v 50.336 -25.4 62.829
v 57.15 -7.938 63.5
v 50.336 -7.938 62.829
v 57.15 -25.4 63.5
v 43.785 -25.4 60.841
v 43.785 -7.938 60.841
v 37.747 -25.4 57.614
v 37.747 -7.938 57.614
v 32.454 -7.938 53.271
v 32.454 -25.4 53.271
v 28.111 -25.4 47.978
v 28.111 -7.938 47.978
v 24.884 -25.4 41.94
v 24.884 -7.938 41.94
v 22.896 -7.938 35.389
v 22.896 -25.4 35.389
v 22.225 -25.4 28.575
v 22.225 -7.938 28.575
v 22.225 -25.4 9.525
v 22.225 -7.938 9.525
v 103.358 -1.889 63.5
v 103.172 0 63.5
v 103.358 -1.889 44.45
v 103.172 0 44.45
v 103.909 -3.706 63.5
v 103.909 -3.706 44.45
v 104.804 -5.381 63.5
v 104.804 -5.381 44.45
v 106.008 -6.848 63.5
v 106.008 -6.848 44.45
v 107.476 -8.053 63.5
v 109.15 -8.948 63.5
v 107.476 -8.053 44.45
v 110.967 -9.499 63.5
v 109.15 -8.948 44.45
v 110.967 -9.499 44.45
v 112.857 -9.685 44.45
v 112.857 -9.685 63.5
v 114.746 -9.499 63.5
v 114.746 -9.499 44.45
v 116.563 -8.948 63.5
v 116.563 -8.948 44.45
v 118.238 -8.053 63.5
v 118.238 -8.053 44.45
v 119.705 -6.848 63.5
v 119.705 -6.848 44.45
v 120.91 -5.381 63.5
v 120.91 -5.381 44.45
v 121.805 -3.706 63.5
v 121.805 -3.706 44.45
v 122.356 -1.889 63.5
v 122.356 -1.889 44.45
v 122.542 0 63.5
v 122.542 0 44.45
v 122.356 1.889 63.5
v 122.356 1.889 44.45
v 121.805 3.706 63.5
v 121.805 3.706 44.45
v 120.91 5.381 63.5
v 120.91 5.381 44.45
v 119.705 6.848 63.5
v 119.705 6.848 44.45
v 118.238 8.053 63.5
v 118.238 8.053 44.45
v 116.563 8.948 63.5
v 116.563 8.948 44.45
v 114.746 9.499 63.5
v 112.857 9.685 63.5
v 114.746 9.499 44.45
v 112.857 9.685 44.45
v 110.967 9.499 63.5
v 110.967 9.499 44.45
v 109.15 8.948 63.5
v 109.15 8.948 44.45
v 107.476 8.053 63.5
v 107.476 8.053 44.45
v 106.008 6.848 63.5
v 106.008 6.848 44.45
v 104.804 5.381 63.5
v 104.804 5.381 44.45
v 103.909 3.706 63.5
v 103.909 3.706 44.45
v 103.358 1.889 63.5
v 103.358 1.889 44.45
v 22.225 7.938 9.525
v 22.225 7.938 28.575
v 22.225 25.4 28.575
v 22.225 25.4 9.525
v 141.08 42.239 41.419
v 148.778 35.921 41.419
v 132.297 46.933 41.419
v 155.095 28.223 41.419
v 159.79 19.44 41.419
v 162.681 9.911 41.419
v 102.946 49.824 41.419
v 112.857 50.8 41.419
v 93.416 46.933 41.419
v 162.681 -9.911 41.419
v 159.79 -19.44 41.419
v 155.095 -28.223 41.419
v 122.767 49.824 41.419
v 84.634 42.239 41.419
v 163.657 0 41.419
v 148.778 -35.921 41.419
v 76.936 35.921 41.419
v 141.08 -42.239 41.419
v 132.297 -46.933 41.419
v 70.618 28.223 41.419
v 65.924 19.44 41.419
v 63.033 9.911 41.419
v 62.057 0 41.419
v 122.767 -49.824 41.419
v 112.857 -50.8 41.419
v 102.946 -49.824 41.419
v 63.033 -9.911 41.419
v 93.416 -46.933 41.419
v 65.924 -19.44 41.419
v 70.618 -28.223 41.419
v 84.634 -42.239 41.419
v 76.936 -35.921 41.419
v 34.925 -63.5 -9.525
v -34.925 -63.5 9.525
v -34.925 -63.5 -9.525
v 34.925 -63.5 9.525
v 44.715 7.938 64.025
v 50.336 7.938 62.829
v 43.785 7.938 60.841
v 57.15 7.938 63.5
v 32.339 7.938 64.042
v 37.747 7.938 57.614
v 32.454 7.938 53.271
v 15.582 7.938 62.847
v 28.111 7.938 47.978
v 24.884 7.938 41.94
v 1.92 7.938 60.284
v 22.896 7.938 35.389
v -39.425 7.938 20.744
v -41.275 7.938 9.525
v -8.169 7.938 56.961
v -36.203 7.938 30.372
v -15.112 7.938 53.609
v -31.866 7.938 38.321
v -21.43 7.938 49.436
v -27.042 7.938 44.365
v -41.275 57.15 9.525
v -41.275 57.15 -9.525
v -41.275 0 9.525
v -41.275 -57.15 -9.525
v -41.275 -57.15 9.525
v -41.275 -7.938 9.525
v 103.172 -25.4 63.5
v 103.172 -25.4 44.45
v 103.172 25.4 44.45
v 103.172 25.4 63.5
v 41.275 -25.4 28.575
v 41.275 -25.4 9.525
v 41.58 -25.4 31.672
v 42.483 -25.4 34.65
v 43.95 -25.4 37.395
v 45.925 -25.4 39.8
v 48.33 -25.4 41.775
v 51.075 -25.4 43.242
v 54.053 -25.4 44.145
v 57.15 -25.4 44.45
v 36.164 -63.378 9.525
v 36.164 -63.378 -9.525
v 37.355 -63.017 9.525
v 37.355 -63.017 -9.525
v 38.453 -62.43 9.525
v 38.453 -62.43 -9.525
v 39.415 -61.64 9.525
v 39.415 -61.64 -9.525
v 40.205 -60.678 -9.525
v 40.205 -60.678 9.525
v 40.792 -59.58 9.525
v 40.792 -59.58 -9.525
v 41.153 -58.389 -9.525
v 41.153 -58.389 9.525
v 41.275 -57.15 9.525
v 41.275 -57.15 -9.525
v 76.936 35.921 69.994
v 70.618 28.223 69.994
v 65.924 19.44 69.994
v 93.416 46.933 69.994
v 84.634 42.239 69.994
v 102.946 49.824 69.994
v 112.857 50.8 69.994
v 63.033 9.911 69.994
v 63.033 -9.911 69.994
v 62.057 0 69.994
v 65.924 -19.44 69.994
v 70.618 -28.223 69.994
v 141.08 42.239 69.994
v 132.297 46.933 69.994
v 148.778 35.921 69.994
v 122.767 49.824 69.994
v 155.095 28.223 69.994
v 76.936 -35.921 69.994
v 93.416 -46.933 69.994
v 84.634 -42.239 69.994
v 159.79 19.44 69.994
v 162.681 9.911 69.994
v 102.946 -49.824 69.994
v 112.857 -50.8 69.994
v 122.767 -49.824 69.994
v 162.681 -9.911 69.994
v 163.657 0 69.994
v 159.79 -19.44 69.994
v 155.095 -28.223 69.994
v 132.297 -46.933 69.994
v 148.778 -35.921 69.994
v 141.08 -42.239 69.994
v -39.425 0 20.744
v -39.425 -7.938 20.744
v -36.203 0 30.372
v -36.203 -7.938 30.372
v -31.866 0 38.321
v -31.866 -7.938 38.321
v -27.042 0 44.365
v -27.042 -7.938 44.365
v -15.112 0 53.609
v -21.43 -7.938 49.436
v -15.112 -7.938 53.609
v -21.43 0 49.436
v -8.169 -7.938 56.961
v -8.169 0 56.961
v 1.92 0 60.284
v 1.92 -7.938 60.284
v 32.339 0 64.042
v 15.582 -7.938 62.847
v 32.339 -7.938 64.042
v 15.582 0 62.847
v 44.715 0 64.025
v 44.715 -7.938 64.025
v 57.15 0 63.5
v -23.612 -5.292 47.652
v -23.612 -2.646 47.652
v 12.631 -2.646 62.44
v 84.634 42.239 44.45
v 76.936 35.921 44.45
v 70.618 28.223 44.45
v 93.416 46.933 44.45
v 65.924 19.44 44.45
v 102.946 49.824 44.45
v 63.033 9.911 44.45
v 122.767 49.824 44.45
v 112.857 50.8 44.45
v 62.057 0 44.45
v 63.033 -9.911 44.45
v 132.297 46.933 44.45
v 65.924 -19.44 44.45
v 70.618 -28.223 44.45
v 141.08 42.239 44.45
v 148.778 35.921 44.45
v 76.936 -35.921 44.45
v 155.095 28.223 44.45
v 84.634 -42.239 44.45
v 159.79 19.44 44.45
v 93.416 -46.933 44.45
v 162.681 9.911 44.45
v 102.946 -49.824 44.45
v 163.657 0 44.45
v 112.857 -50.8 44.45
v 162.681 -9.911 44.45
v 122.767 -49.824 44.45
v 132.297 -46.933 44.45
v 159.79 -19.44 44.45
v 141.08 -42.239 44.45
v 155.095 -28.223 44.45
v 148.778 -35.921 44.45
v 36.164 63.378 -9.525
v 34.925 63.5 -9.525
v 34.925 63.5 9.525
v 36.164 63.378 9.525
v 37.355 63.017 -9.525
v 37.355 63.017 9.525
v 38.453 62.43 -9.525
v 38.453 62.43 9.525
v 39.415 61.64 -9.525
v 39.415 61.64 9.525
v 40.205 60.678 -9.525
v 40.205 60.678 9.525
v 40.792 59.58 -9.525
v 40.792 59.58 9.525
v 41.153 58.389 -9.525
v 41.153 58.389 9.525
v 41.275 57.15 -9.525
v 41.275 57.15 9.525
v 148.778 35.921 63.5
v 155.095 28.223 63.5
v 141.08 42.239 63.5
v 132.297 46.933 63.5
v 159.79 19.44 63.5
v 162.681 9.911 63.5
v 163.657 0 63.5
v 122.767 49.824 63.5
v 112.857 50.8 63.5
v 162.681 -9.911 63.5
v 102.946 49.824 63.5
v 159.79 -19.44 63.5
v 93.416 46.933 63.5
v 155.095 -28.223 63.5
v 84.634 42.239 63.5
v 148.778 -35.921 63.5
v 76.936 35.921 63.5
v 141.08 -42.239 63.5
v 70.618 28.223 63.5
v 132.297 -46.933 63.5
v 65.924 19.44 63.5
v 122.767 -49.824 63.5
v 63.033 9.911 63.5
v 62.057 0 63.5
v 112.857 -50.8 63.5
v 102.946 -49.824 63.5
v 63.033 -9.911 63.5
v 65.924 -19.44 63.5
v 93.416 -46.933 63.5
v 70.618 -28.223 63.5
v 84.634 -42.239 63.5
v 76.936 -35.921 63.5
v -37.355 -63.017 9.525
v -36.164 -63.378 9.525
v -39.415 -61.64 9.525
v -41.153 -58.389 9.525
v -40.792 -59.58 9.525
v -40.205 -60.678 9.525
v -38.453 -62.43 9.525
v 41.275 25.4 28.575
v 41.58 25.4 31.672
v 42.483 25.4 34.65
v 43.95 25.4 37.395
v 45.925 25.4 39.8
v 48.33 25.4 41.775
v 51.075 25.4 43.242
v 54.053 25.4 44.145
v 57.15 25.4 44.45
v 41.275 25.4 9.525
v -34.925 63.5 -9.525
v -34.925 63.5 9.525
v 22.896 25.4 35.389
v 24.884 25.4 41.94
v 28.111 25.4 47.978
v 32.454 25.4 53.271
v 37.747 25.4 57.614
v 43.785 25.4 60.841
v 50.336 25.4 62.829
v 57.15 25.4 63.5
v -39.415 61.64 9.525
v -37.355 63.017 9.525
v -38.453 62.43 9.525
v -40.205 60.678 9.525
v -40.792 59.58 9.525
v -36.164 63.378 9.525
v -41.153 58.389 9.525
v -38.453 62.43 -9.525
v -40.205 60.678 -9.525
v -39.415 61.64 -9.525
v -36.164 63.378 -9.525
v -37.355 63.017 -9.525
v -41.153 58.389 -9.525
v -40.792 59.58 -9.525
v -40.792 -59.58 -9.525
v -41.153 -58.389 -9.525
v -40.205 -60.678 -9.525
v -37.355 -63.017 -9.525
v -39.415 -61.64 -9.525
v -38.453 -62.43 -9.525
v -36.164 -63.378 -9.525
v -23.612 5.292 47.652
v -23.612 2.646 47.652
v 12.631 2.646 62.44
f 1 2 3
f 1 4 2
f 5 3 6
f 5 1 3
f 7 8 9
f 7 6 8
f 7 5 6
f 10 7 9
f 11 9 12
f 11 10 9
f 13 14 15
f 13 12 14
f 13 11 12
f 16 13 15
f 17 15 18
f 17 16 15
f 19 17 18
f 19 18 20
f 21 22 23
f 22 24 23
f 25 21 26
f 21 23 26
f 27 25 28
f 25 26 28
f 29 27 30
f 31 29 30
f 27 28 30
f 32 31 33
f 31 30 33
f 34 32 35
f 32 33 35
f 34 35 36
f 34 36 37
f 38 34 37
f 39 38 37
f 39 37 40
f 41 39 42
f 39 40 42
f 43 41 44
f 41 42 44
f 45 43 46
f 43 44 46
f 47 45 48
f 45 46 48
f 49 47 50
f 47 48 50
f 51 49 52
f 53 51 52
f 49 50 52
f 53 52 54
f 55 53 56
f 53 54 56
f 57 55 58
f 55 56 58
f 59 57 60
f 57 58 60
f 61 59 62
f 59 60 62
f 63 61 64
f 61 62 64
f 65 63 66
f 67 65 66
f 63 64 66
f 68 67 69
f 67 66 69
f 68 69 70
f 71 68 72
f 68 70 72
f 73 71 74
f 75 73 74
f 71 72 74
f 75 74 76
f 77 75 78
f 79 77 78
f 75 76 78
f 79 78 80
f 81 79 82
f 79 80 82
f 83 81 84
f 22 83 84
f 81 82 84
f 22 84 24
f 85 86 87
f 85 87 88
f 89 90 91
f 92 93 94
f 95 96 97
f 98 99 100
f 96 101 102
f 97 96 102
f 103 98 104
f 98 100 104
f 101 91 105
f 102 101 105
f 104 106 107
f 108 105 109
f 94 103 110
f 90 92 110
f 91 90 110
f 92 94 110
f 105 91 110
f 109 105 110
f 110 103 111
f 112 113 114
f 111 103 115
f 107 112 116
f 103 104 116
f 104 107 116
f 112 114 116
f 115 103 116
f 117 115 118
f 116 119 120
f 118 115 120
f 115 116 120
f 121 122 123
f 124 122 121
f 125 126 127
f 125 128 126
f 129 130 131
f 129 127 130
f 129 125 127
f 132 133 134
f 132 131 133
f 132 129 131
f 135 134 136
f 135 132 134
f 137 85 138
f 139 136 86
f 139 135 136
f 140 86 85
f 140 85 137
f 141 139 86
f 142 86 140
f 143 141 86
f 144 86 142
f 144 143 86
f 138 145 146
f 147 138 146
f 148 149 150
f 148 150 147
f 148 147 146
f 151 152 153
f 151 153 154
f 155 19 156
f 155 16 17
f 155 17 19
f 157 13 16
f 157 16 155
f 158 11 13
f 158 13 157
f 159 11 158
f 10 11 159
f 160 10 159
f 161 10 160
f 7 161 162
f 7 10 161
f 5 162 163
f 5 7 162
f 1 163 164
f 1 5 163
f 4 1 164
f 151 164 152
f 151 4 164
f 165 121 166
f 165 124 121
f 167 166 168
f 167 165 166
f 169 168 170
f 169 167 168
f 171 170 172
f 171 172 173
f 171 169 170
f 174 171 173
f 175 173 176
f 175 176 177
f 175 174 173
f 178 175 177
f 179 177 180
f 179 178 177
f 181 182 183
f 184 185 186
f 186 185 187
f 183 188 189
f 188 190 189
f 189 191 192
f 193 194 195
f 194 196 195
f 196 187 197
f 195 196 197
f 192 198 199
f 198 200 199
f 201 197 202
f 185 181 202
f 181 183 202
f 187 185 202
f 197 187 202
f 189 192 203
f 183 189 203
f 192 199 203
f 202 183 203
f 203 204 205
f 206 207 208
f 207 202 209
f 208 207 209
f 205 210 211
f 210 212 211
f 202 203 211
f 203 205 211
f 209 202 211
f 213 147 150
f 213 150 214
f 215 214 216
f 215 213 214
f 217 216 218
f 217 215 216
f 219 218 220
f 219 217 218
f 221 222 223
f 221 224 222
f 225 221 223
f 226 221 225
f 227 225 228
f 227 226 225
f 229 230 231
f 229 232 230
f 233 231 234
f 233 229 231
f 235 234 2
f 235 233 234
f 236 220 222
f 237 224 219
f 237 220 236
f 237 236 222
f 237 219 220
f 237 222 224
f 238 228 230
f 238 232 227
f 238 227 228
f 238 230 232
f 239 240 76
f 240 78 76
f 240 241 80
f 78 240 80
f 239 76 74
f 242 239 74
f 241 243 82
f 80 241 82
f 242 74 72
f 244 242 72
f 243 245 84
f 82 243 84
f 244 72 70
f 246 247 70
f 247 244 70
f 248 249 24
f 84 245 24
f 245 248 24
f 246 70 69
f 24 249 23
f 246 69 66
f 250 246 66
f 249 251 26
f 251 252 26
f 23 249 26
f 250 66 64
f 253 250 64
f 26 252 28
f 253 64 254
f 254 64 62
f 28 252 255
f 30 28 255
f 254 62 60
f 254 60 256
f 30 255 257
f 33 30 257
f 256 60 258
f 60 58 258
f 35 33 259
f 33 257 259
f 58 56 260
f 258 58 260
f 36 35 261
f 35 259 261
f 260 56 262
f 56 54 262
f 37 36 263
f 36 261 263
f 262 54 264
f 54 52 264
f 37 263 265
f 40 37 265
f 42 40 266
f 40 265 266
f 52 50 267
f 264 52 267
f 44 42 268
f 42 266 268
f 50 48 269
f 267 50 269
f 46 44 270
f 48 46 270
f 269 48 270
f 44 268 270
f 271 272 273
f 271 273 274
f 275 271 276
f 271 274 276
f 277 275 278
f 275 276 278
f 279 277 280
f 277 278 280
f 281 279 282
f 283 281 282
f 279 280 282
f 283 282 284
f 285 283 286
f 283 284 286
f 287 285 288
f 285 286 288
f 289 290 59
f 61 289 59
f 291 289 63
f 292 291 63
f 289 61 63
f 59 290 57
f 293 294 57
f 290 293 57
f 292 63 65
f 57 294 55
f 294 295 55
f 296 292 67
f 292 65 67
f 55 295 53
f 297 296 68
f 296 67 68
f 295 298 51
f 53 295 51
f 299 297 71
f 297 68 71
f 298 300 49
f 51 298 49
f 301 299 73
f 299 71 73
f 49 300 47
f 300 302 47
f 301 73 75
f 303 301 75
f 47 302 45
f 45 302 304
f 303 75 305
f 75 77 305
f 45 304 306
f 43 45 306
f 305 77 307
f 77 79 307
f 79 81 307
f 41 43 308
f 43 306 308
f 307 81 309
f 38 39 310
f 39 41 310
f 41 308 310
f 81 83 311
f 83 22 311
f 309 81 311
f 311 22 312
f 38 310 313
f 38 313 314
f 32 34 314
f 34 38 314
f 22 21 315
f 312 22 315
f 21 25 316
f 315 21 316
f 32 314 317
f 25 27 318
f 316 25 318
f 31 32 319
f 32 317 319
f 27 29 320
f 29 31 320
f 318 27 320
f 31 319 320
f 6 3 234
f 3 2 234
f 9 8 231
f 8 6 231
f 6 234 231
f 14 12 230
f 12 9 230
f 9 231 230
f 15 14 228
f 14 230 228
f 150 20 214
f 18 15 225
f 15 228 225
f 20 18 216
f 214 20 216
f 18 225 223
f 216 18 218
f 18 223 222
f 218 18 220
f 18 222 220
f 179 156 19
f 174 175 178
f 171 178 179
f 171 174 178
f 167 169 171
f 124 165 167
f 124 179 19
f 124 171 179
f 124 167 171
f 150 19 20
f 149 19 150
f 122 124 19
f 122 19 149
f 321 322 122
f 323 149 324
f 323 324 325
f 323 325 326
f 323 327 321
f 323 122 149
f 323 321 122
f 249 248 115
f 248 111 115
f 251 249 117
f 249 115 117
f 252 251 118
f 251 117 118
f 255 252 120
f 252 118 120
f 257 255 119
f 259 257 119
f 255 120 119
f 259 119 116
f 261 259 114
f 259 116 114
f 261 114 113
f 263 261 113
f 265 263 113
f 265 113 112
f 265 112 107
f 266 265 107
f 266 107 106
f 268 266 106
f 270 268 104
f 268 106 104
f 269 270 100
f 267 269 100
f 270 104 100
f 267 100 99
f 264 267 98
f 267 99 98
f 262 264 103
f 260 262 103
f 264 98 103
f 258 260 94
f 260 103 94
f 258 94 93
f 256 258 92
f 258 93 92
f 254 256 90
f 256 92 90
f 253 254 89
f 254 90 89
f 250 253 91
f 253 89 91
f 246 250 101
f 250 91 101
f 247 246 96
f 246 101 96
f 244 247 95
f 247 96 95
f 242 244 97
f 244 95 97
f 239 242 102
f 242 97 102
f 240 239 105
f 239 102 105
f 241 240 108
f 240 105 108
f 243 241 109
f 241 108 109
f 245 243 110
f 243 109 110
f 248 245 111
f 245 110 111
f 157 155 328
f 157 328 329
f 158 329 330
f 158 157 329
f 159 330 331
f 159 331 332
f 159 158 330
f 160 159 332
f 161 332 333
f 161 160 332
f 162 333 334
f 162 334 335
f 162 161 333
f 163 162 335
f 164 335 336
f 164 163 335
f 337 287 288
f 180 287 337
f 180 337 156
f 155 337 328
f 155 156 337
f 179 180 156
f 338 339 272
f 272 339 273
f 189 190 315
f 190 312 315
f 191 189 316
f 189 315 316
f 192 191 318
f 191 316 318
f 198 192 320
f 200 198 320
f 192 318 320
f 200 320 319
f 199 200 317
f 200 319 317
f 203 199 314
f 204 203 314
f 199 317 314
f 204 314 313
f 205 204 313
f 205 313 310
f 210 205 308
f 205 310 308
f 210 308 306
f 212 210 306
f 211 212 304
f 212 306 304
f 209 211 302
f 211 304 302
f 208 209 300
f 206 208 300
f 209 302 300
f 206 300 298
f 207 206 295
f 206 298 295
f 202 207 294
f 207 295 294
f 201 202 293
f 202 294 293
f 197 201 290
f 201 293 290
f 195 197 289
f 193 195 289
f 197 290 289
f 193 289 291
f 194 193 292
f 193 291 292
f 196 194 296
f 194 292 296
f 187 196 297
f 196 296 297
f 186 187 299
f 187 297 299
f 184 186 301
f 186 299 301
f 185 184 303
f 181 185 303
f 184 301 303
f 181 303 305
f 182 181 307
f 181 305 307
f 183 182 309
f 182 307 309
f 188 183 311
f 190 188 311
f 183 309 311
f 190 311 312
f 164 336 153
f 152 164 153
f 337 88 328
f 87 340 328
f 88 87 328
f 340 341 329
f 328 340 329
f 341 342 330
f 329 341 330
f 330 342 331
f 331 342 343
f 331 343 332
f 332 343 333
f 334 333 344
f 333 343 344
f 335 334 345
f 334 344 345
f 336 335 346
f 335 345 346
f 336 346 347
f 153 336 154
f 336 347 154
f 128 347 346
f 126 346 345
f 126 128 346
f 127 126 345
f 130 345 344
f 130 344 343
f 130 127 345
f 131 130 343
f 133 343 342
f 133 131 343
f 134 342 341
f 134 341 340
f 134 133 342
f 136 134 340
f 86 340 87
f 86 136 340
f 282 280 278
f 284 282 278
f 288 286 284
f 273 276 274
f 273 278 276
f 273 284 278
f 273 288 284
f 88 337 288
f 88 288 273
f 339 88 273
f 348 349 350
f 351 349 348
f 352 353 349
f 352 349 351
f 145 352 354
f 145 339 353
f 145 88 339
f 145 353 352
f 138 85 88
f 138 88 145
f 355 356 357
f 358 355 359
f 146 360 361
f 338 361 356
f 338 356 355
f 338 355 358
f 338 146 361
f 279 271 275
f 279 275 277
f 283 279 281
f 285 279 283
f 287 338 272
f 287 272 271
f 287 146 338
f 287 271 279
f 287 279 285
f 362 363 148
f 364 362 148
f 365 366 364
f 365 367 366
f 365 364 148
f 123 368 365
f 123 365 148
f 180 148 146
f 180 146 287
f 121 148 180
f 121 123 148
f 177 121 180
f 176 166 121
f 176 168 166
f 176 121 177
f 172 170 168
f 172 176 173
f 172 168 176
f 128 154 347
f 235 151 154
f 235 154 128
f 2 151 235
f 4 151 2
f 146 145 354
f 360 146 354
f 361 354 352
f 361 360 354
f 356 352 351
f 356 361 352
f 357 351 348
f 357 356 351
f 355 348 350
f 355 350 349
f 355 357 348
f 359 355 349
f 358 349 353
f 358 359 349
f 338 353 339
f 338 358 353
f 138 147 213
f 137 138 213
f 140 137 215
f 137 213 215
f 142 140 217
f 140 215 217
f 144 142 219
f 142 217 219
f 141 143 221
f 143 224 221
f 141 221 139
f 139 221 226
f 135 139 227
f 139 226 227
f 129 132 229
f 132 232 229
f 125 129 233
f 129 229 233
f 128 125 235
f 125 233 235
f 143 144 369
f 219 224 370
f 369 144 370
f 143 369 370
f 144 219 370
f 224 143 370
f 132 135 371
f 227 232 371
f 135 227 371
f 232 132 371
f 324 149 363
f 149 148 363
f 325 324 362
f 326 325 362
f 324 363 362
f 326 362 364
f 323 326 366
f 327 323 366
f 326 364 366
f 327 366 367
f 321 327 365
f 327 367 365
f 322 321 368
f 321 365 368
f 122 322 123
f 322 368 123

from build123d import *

# Parameters (mm, degrees)
F1_DEPTH = 63.5
F0_W     = 41.1148486172
F0_H     = 19.05
F2_DEPTH = 25.4
F3_DEPTH = 7.9375
F5_R     = 6.35


with BuildPart() as f1:
    # F0 (on Front) → F1 (new body, symmetric)
    with BuildSketch(Plane.XZ):
        Polygon((-41.275, 9.525), (-41.275, -9.525), (41.275, -9.525), (41.275, 9.525), (22.225, 9.525), align=None)
    extrude(amount=F1_DEPTH, both=True)

    # F0 (on Front) → F2 (join, symmetric)
    with BuildSketch(Plane.XZ):
        with BuildLine():
            Line((22.225, 9.525), (41.275, 9.525))
            Line((41.275, 9.525), (41.275, 28.575))
            ThreePointArc((41.275, 28.575), (45.9246798487, 39.8003201513), (57.15, 44.45))
            Line((57.15, 44.45), (62.0568133146, 44.45))
            Line((62.0568133146, 44.45), (62.0568133146, 63.5))
            Line((62.0568133146, 63.5), (57.15, 63.5))
            ThreePointArc((57.15, 63.5), (32.4542956671, 53.2707043329), (22.225, 28.575))
            Line((22.225, 28.575), (22.225, 9.525))
        make_face()
        with Locations((82.6142376232, 53.975)):
            Rectangle(F0_W, F0_H)
    extrude(amount=F2_DEPTH, both=True)

    # F0 (on Front) → F3 (join, symmetric)
    with BuildSketch(Plane.XZ):
        with BuildLine():
            add(Edge.make_bspline(
                [(-41.275, 9.525), (-36.3353202119, 62.5270418823), (11.9270985628, 66.0983518143), (57.15, 63.5)],
                knots=[0, 0, 0, 0, 112.2532015134, 112.2532015134, 112.2532015134, 112.2532015134], degree=3))
            Line((-41.275, 9.525), (22.225, 9.525))
            Line((22.225, 9.525), (22.225, 28.575))
            ThreePointArc((22.225, 28.575), (32.4542956671, 53.2707043329), (57.15, 63.5))
        make_face()
    extrude(amount=F3_DEPTH, both=True)

    # F5
    f5_edges = [f1.edges().sort_by_distance(p)[0] for p in [
        (41.275, -63.5, 0),
        (-41.275, -63.5, 0),
        (41.275, 63.5, 0),
        (-41.275, 63.5, 0),
    ]]
    fillet(f5_edges, radius=F5_R)


with BuildPart() as f4:
    # F0 (on Front) → F4 (revolve)
    with BuildSketch(Plane.XZ):
        Polygon((62.0568133146, 69.9943239679), (62.0568133146, 63.5), (103.1716619318, 63.5), (103.1716619318, 44.45), (62.0568133146, 44.45), (62.0568133146, 41.4193239679), (112.8568133146, 41.4193239679), (112.8568133146, 69.9943239679), align=None)
    revolve(axis=Axis((112.8568133146, 0, 55.7068239679), (0, 0, 1)))


solid = Compound([f1.part, f4.part])
